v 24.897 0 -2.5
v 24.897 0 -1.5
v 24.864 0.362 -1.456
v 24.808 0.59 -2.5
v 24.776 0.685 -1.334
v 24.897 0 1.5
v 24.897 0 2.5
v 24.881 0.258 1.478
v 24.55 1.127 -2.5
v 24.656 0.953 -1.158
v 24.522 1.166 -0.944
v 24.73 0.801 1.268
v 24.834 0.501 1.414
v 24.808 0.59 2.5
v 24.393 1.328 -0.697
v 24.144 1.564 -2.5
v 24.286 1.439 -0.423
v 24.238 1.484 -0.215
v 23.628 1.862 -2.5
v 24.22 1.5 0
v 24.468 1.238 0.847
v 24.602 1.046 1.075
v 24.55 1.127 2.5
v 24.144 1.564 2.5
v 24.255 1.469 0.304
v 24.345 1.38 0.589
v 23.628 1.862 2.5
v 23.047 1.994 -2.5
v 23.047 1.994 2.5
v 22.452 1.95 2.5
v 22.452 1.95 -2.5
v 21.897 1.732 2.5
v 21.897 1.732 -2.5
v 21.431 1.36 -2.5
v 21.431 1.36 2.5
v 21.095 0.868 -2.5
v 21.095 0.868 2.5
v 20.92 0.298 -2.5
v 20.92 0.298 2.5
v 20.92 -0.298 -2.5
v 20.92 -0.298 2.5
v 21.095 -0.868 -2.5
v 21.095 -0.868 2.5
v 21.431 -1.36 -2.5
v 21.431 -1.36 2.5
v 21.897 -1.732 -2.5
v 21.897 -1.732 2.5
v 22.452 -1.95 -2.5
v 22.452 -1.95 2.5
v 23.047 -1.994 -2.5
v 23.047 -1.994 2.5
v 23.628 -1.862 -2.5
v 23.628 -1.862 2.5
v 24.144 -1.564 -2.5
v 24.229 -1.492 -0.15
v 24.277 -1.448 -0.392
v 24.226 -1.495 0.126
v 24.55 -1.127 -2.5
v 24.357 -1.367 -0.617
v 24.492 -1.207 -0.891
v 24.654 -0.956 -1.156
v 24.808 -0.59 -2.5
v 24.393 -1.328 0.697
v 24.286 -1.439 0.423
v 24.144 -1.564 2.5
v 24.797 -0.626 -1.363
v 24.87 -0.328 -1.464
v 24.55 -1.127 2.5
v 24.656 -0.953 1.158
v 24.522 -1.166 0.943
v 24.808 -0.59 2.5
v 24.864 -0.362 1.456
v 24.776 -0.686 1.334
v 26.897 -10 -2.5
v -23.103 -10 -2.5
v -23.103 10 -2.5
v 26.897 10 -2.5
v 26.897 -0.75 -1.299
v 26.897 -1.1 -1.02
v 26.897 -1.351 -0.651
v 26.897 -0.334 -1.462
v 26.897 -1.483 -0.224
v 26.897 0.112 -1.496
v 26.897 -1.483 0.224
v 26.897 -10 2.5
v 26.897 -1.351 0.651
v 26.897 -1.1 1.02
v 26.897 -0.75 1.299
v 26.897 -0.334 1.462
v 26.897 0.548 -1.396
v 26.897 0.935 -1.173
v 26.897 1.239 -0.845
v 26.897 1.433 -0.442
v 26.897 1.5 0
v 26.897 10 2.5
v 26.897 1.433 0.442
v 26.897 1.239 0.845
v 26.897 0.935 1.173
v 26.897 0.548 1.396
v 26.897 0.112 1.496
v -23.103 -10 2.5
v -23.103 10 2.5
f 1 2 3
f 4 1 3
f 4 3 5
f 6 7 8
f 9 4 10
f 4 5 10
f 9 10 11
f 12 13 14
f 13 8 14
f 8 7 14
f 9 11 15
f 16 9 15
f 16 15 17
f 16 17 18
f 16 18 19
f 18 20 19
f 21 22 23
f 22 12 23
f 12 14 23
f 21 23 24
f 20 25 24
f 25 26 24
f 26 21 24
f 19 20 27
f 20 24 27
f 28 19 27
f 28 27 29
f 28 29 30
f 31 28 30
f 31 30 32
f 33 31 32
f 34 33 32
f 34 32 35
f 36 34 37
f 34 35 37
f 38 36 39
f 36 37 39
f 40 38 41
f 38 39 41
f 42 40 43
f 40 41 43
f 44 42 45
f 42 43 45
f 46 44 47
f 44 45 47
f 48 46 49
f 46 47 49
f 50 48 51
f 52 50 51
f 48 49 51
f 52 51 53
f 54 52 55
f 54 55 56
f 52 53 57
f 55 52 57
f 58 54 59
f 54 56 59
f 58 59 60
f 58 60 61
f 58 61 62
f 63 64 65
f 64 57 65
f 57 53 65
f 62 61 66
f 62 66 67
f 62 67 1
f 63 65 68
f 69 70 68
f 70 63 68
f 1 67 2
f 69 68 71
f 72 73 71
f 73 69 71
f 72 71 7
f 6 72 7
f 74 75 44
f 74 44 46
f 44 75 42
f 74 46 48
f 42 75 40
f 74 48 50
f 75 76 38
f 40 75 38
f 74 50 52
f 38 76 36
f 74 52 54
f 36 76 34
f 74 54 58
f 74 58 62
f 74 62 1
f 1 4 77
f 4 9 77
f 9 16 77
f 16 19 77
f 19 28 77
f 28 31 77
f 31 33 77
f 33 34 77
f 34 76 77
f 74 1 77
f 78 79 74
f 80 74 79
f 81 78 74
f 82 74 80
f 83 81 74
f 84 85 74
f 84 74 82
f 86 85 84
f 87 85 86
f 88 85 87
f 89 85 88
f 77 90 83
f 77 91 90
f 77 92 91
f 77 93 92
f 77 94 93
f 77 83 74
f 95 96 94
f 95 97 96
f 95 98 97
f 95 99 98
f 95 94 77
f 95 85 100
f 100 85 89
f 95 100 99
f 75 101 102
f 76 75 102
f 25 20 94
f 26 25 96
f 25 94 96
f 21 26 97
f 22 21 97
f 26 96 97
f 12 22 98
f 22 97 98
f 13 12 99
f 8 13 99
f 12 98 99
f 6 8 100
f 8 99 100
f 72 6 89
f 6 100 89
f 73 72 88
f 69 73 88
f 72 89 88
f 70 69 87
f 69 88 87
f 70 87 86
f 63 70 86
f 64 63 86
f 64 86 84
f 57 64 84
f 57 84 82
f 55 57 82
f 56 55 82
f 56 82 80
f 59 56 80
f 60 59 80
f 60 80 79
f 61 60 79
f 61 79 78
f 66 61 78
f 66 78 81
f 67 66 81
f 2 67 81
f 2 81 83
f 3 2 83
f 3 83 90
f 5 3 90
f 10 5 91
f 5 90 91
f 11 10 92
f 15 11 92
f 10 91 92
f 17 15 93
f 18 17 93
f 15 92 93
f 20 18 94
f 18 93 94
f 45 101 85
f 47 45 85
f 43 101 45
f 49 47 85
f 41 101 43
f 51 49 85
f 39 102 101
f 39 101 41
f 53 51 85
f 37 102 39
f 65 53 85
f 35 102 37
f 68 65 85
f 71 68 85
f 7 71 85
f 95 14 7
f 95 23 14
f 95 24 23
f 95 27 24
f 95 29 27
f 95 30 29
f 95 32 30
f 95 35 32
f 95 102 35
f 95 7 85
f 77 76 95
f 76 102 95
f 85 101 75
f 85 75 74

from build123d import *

# Parameters (mm, degrees)
F0_W     = 50
F0_H     = 20
F1_DEPTH = 2.5
F2_R     = 2
F3_DEPTH = 5.001
F4_R     = 1.5
F5_DEPTH = 5


with BuildPart() as f1:
    # F0 (on Top) → F1 (new body, symmetric)
    with BuildSketch(Plane.XY):
        with Locations((1.897323, 0)):
            Rectangle(F0_W, F0_H)
    extrude(amount=F1_DEPTH, both=True)

    # F2 (on face) → F3 (cut, through all)
    with BuildSketch(Plane.XY.offset(2.5)):
        with Locations((22.897323, 0)):
            Circle(F2_R)
    extrude(amount=-F3_DEPTH, mode=Mode.SUBTRACT)

    # F4 (on face) → F5 (cut)
    with BuildSketch(Plane.YZ.offset(26.897323)):
        Circle(F4_R)
    extrude(amount=-F5_DEPTH, mode=Mode.SUBTRACT)


solid = f1.part
